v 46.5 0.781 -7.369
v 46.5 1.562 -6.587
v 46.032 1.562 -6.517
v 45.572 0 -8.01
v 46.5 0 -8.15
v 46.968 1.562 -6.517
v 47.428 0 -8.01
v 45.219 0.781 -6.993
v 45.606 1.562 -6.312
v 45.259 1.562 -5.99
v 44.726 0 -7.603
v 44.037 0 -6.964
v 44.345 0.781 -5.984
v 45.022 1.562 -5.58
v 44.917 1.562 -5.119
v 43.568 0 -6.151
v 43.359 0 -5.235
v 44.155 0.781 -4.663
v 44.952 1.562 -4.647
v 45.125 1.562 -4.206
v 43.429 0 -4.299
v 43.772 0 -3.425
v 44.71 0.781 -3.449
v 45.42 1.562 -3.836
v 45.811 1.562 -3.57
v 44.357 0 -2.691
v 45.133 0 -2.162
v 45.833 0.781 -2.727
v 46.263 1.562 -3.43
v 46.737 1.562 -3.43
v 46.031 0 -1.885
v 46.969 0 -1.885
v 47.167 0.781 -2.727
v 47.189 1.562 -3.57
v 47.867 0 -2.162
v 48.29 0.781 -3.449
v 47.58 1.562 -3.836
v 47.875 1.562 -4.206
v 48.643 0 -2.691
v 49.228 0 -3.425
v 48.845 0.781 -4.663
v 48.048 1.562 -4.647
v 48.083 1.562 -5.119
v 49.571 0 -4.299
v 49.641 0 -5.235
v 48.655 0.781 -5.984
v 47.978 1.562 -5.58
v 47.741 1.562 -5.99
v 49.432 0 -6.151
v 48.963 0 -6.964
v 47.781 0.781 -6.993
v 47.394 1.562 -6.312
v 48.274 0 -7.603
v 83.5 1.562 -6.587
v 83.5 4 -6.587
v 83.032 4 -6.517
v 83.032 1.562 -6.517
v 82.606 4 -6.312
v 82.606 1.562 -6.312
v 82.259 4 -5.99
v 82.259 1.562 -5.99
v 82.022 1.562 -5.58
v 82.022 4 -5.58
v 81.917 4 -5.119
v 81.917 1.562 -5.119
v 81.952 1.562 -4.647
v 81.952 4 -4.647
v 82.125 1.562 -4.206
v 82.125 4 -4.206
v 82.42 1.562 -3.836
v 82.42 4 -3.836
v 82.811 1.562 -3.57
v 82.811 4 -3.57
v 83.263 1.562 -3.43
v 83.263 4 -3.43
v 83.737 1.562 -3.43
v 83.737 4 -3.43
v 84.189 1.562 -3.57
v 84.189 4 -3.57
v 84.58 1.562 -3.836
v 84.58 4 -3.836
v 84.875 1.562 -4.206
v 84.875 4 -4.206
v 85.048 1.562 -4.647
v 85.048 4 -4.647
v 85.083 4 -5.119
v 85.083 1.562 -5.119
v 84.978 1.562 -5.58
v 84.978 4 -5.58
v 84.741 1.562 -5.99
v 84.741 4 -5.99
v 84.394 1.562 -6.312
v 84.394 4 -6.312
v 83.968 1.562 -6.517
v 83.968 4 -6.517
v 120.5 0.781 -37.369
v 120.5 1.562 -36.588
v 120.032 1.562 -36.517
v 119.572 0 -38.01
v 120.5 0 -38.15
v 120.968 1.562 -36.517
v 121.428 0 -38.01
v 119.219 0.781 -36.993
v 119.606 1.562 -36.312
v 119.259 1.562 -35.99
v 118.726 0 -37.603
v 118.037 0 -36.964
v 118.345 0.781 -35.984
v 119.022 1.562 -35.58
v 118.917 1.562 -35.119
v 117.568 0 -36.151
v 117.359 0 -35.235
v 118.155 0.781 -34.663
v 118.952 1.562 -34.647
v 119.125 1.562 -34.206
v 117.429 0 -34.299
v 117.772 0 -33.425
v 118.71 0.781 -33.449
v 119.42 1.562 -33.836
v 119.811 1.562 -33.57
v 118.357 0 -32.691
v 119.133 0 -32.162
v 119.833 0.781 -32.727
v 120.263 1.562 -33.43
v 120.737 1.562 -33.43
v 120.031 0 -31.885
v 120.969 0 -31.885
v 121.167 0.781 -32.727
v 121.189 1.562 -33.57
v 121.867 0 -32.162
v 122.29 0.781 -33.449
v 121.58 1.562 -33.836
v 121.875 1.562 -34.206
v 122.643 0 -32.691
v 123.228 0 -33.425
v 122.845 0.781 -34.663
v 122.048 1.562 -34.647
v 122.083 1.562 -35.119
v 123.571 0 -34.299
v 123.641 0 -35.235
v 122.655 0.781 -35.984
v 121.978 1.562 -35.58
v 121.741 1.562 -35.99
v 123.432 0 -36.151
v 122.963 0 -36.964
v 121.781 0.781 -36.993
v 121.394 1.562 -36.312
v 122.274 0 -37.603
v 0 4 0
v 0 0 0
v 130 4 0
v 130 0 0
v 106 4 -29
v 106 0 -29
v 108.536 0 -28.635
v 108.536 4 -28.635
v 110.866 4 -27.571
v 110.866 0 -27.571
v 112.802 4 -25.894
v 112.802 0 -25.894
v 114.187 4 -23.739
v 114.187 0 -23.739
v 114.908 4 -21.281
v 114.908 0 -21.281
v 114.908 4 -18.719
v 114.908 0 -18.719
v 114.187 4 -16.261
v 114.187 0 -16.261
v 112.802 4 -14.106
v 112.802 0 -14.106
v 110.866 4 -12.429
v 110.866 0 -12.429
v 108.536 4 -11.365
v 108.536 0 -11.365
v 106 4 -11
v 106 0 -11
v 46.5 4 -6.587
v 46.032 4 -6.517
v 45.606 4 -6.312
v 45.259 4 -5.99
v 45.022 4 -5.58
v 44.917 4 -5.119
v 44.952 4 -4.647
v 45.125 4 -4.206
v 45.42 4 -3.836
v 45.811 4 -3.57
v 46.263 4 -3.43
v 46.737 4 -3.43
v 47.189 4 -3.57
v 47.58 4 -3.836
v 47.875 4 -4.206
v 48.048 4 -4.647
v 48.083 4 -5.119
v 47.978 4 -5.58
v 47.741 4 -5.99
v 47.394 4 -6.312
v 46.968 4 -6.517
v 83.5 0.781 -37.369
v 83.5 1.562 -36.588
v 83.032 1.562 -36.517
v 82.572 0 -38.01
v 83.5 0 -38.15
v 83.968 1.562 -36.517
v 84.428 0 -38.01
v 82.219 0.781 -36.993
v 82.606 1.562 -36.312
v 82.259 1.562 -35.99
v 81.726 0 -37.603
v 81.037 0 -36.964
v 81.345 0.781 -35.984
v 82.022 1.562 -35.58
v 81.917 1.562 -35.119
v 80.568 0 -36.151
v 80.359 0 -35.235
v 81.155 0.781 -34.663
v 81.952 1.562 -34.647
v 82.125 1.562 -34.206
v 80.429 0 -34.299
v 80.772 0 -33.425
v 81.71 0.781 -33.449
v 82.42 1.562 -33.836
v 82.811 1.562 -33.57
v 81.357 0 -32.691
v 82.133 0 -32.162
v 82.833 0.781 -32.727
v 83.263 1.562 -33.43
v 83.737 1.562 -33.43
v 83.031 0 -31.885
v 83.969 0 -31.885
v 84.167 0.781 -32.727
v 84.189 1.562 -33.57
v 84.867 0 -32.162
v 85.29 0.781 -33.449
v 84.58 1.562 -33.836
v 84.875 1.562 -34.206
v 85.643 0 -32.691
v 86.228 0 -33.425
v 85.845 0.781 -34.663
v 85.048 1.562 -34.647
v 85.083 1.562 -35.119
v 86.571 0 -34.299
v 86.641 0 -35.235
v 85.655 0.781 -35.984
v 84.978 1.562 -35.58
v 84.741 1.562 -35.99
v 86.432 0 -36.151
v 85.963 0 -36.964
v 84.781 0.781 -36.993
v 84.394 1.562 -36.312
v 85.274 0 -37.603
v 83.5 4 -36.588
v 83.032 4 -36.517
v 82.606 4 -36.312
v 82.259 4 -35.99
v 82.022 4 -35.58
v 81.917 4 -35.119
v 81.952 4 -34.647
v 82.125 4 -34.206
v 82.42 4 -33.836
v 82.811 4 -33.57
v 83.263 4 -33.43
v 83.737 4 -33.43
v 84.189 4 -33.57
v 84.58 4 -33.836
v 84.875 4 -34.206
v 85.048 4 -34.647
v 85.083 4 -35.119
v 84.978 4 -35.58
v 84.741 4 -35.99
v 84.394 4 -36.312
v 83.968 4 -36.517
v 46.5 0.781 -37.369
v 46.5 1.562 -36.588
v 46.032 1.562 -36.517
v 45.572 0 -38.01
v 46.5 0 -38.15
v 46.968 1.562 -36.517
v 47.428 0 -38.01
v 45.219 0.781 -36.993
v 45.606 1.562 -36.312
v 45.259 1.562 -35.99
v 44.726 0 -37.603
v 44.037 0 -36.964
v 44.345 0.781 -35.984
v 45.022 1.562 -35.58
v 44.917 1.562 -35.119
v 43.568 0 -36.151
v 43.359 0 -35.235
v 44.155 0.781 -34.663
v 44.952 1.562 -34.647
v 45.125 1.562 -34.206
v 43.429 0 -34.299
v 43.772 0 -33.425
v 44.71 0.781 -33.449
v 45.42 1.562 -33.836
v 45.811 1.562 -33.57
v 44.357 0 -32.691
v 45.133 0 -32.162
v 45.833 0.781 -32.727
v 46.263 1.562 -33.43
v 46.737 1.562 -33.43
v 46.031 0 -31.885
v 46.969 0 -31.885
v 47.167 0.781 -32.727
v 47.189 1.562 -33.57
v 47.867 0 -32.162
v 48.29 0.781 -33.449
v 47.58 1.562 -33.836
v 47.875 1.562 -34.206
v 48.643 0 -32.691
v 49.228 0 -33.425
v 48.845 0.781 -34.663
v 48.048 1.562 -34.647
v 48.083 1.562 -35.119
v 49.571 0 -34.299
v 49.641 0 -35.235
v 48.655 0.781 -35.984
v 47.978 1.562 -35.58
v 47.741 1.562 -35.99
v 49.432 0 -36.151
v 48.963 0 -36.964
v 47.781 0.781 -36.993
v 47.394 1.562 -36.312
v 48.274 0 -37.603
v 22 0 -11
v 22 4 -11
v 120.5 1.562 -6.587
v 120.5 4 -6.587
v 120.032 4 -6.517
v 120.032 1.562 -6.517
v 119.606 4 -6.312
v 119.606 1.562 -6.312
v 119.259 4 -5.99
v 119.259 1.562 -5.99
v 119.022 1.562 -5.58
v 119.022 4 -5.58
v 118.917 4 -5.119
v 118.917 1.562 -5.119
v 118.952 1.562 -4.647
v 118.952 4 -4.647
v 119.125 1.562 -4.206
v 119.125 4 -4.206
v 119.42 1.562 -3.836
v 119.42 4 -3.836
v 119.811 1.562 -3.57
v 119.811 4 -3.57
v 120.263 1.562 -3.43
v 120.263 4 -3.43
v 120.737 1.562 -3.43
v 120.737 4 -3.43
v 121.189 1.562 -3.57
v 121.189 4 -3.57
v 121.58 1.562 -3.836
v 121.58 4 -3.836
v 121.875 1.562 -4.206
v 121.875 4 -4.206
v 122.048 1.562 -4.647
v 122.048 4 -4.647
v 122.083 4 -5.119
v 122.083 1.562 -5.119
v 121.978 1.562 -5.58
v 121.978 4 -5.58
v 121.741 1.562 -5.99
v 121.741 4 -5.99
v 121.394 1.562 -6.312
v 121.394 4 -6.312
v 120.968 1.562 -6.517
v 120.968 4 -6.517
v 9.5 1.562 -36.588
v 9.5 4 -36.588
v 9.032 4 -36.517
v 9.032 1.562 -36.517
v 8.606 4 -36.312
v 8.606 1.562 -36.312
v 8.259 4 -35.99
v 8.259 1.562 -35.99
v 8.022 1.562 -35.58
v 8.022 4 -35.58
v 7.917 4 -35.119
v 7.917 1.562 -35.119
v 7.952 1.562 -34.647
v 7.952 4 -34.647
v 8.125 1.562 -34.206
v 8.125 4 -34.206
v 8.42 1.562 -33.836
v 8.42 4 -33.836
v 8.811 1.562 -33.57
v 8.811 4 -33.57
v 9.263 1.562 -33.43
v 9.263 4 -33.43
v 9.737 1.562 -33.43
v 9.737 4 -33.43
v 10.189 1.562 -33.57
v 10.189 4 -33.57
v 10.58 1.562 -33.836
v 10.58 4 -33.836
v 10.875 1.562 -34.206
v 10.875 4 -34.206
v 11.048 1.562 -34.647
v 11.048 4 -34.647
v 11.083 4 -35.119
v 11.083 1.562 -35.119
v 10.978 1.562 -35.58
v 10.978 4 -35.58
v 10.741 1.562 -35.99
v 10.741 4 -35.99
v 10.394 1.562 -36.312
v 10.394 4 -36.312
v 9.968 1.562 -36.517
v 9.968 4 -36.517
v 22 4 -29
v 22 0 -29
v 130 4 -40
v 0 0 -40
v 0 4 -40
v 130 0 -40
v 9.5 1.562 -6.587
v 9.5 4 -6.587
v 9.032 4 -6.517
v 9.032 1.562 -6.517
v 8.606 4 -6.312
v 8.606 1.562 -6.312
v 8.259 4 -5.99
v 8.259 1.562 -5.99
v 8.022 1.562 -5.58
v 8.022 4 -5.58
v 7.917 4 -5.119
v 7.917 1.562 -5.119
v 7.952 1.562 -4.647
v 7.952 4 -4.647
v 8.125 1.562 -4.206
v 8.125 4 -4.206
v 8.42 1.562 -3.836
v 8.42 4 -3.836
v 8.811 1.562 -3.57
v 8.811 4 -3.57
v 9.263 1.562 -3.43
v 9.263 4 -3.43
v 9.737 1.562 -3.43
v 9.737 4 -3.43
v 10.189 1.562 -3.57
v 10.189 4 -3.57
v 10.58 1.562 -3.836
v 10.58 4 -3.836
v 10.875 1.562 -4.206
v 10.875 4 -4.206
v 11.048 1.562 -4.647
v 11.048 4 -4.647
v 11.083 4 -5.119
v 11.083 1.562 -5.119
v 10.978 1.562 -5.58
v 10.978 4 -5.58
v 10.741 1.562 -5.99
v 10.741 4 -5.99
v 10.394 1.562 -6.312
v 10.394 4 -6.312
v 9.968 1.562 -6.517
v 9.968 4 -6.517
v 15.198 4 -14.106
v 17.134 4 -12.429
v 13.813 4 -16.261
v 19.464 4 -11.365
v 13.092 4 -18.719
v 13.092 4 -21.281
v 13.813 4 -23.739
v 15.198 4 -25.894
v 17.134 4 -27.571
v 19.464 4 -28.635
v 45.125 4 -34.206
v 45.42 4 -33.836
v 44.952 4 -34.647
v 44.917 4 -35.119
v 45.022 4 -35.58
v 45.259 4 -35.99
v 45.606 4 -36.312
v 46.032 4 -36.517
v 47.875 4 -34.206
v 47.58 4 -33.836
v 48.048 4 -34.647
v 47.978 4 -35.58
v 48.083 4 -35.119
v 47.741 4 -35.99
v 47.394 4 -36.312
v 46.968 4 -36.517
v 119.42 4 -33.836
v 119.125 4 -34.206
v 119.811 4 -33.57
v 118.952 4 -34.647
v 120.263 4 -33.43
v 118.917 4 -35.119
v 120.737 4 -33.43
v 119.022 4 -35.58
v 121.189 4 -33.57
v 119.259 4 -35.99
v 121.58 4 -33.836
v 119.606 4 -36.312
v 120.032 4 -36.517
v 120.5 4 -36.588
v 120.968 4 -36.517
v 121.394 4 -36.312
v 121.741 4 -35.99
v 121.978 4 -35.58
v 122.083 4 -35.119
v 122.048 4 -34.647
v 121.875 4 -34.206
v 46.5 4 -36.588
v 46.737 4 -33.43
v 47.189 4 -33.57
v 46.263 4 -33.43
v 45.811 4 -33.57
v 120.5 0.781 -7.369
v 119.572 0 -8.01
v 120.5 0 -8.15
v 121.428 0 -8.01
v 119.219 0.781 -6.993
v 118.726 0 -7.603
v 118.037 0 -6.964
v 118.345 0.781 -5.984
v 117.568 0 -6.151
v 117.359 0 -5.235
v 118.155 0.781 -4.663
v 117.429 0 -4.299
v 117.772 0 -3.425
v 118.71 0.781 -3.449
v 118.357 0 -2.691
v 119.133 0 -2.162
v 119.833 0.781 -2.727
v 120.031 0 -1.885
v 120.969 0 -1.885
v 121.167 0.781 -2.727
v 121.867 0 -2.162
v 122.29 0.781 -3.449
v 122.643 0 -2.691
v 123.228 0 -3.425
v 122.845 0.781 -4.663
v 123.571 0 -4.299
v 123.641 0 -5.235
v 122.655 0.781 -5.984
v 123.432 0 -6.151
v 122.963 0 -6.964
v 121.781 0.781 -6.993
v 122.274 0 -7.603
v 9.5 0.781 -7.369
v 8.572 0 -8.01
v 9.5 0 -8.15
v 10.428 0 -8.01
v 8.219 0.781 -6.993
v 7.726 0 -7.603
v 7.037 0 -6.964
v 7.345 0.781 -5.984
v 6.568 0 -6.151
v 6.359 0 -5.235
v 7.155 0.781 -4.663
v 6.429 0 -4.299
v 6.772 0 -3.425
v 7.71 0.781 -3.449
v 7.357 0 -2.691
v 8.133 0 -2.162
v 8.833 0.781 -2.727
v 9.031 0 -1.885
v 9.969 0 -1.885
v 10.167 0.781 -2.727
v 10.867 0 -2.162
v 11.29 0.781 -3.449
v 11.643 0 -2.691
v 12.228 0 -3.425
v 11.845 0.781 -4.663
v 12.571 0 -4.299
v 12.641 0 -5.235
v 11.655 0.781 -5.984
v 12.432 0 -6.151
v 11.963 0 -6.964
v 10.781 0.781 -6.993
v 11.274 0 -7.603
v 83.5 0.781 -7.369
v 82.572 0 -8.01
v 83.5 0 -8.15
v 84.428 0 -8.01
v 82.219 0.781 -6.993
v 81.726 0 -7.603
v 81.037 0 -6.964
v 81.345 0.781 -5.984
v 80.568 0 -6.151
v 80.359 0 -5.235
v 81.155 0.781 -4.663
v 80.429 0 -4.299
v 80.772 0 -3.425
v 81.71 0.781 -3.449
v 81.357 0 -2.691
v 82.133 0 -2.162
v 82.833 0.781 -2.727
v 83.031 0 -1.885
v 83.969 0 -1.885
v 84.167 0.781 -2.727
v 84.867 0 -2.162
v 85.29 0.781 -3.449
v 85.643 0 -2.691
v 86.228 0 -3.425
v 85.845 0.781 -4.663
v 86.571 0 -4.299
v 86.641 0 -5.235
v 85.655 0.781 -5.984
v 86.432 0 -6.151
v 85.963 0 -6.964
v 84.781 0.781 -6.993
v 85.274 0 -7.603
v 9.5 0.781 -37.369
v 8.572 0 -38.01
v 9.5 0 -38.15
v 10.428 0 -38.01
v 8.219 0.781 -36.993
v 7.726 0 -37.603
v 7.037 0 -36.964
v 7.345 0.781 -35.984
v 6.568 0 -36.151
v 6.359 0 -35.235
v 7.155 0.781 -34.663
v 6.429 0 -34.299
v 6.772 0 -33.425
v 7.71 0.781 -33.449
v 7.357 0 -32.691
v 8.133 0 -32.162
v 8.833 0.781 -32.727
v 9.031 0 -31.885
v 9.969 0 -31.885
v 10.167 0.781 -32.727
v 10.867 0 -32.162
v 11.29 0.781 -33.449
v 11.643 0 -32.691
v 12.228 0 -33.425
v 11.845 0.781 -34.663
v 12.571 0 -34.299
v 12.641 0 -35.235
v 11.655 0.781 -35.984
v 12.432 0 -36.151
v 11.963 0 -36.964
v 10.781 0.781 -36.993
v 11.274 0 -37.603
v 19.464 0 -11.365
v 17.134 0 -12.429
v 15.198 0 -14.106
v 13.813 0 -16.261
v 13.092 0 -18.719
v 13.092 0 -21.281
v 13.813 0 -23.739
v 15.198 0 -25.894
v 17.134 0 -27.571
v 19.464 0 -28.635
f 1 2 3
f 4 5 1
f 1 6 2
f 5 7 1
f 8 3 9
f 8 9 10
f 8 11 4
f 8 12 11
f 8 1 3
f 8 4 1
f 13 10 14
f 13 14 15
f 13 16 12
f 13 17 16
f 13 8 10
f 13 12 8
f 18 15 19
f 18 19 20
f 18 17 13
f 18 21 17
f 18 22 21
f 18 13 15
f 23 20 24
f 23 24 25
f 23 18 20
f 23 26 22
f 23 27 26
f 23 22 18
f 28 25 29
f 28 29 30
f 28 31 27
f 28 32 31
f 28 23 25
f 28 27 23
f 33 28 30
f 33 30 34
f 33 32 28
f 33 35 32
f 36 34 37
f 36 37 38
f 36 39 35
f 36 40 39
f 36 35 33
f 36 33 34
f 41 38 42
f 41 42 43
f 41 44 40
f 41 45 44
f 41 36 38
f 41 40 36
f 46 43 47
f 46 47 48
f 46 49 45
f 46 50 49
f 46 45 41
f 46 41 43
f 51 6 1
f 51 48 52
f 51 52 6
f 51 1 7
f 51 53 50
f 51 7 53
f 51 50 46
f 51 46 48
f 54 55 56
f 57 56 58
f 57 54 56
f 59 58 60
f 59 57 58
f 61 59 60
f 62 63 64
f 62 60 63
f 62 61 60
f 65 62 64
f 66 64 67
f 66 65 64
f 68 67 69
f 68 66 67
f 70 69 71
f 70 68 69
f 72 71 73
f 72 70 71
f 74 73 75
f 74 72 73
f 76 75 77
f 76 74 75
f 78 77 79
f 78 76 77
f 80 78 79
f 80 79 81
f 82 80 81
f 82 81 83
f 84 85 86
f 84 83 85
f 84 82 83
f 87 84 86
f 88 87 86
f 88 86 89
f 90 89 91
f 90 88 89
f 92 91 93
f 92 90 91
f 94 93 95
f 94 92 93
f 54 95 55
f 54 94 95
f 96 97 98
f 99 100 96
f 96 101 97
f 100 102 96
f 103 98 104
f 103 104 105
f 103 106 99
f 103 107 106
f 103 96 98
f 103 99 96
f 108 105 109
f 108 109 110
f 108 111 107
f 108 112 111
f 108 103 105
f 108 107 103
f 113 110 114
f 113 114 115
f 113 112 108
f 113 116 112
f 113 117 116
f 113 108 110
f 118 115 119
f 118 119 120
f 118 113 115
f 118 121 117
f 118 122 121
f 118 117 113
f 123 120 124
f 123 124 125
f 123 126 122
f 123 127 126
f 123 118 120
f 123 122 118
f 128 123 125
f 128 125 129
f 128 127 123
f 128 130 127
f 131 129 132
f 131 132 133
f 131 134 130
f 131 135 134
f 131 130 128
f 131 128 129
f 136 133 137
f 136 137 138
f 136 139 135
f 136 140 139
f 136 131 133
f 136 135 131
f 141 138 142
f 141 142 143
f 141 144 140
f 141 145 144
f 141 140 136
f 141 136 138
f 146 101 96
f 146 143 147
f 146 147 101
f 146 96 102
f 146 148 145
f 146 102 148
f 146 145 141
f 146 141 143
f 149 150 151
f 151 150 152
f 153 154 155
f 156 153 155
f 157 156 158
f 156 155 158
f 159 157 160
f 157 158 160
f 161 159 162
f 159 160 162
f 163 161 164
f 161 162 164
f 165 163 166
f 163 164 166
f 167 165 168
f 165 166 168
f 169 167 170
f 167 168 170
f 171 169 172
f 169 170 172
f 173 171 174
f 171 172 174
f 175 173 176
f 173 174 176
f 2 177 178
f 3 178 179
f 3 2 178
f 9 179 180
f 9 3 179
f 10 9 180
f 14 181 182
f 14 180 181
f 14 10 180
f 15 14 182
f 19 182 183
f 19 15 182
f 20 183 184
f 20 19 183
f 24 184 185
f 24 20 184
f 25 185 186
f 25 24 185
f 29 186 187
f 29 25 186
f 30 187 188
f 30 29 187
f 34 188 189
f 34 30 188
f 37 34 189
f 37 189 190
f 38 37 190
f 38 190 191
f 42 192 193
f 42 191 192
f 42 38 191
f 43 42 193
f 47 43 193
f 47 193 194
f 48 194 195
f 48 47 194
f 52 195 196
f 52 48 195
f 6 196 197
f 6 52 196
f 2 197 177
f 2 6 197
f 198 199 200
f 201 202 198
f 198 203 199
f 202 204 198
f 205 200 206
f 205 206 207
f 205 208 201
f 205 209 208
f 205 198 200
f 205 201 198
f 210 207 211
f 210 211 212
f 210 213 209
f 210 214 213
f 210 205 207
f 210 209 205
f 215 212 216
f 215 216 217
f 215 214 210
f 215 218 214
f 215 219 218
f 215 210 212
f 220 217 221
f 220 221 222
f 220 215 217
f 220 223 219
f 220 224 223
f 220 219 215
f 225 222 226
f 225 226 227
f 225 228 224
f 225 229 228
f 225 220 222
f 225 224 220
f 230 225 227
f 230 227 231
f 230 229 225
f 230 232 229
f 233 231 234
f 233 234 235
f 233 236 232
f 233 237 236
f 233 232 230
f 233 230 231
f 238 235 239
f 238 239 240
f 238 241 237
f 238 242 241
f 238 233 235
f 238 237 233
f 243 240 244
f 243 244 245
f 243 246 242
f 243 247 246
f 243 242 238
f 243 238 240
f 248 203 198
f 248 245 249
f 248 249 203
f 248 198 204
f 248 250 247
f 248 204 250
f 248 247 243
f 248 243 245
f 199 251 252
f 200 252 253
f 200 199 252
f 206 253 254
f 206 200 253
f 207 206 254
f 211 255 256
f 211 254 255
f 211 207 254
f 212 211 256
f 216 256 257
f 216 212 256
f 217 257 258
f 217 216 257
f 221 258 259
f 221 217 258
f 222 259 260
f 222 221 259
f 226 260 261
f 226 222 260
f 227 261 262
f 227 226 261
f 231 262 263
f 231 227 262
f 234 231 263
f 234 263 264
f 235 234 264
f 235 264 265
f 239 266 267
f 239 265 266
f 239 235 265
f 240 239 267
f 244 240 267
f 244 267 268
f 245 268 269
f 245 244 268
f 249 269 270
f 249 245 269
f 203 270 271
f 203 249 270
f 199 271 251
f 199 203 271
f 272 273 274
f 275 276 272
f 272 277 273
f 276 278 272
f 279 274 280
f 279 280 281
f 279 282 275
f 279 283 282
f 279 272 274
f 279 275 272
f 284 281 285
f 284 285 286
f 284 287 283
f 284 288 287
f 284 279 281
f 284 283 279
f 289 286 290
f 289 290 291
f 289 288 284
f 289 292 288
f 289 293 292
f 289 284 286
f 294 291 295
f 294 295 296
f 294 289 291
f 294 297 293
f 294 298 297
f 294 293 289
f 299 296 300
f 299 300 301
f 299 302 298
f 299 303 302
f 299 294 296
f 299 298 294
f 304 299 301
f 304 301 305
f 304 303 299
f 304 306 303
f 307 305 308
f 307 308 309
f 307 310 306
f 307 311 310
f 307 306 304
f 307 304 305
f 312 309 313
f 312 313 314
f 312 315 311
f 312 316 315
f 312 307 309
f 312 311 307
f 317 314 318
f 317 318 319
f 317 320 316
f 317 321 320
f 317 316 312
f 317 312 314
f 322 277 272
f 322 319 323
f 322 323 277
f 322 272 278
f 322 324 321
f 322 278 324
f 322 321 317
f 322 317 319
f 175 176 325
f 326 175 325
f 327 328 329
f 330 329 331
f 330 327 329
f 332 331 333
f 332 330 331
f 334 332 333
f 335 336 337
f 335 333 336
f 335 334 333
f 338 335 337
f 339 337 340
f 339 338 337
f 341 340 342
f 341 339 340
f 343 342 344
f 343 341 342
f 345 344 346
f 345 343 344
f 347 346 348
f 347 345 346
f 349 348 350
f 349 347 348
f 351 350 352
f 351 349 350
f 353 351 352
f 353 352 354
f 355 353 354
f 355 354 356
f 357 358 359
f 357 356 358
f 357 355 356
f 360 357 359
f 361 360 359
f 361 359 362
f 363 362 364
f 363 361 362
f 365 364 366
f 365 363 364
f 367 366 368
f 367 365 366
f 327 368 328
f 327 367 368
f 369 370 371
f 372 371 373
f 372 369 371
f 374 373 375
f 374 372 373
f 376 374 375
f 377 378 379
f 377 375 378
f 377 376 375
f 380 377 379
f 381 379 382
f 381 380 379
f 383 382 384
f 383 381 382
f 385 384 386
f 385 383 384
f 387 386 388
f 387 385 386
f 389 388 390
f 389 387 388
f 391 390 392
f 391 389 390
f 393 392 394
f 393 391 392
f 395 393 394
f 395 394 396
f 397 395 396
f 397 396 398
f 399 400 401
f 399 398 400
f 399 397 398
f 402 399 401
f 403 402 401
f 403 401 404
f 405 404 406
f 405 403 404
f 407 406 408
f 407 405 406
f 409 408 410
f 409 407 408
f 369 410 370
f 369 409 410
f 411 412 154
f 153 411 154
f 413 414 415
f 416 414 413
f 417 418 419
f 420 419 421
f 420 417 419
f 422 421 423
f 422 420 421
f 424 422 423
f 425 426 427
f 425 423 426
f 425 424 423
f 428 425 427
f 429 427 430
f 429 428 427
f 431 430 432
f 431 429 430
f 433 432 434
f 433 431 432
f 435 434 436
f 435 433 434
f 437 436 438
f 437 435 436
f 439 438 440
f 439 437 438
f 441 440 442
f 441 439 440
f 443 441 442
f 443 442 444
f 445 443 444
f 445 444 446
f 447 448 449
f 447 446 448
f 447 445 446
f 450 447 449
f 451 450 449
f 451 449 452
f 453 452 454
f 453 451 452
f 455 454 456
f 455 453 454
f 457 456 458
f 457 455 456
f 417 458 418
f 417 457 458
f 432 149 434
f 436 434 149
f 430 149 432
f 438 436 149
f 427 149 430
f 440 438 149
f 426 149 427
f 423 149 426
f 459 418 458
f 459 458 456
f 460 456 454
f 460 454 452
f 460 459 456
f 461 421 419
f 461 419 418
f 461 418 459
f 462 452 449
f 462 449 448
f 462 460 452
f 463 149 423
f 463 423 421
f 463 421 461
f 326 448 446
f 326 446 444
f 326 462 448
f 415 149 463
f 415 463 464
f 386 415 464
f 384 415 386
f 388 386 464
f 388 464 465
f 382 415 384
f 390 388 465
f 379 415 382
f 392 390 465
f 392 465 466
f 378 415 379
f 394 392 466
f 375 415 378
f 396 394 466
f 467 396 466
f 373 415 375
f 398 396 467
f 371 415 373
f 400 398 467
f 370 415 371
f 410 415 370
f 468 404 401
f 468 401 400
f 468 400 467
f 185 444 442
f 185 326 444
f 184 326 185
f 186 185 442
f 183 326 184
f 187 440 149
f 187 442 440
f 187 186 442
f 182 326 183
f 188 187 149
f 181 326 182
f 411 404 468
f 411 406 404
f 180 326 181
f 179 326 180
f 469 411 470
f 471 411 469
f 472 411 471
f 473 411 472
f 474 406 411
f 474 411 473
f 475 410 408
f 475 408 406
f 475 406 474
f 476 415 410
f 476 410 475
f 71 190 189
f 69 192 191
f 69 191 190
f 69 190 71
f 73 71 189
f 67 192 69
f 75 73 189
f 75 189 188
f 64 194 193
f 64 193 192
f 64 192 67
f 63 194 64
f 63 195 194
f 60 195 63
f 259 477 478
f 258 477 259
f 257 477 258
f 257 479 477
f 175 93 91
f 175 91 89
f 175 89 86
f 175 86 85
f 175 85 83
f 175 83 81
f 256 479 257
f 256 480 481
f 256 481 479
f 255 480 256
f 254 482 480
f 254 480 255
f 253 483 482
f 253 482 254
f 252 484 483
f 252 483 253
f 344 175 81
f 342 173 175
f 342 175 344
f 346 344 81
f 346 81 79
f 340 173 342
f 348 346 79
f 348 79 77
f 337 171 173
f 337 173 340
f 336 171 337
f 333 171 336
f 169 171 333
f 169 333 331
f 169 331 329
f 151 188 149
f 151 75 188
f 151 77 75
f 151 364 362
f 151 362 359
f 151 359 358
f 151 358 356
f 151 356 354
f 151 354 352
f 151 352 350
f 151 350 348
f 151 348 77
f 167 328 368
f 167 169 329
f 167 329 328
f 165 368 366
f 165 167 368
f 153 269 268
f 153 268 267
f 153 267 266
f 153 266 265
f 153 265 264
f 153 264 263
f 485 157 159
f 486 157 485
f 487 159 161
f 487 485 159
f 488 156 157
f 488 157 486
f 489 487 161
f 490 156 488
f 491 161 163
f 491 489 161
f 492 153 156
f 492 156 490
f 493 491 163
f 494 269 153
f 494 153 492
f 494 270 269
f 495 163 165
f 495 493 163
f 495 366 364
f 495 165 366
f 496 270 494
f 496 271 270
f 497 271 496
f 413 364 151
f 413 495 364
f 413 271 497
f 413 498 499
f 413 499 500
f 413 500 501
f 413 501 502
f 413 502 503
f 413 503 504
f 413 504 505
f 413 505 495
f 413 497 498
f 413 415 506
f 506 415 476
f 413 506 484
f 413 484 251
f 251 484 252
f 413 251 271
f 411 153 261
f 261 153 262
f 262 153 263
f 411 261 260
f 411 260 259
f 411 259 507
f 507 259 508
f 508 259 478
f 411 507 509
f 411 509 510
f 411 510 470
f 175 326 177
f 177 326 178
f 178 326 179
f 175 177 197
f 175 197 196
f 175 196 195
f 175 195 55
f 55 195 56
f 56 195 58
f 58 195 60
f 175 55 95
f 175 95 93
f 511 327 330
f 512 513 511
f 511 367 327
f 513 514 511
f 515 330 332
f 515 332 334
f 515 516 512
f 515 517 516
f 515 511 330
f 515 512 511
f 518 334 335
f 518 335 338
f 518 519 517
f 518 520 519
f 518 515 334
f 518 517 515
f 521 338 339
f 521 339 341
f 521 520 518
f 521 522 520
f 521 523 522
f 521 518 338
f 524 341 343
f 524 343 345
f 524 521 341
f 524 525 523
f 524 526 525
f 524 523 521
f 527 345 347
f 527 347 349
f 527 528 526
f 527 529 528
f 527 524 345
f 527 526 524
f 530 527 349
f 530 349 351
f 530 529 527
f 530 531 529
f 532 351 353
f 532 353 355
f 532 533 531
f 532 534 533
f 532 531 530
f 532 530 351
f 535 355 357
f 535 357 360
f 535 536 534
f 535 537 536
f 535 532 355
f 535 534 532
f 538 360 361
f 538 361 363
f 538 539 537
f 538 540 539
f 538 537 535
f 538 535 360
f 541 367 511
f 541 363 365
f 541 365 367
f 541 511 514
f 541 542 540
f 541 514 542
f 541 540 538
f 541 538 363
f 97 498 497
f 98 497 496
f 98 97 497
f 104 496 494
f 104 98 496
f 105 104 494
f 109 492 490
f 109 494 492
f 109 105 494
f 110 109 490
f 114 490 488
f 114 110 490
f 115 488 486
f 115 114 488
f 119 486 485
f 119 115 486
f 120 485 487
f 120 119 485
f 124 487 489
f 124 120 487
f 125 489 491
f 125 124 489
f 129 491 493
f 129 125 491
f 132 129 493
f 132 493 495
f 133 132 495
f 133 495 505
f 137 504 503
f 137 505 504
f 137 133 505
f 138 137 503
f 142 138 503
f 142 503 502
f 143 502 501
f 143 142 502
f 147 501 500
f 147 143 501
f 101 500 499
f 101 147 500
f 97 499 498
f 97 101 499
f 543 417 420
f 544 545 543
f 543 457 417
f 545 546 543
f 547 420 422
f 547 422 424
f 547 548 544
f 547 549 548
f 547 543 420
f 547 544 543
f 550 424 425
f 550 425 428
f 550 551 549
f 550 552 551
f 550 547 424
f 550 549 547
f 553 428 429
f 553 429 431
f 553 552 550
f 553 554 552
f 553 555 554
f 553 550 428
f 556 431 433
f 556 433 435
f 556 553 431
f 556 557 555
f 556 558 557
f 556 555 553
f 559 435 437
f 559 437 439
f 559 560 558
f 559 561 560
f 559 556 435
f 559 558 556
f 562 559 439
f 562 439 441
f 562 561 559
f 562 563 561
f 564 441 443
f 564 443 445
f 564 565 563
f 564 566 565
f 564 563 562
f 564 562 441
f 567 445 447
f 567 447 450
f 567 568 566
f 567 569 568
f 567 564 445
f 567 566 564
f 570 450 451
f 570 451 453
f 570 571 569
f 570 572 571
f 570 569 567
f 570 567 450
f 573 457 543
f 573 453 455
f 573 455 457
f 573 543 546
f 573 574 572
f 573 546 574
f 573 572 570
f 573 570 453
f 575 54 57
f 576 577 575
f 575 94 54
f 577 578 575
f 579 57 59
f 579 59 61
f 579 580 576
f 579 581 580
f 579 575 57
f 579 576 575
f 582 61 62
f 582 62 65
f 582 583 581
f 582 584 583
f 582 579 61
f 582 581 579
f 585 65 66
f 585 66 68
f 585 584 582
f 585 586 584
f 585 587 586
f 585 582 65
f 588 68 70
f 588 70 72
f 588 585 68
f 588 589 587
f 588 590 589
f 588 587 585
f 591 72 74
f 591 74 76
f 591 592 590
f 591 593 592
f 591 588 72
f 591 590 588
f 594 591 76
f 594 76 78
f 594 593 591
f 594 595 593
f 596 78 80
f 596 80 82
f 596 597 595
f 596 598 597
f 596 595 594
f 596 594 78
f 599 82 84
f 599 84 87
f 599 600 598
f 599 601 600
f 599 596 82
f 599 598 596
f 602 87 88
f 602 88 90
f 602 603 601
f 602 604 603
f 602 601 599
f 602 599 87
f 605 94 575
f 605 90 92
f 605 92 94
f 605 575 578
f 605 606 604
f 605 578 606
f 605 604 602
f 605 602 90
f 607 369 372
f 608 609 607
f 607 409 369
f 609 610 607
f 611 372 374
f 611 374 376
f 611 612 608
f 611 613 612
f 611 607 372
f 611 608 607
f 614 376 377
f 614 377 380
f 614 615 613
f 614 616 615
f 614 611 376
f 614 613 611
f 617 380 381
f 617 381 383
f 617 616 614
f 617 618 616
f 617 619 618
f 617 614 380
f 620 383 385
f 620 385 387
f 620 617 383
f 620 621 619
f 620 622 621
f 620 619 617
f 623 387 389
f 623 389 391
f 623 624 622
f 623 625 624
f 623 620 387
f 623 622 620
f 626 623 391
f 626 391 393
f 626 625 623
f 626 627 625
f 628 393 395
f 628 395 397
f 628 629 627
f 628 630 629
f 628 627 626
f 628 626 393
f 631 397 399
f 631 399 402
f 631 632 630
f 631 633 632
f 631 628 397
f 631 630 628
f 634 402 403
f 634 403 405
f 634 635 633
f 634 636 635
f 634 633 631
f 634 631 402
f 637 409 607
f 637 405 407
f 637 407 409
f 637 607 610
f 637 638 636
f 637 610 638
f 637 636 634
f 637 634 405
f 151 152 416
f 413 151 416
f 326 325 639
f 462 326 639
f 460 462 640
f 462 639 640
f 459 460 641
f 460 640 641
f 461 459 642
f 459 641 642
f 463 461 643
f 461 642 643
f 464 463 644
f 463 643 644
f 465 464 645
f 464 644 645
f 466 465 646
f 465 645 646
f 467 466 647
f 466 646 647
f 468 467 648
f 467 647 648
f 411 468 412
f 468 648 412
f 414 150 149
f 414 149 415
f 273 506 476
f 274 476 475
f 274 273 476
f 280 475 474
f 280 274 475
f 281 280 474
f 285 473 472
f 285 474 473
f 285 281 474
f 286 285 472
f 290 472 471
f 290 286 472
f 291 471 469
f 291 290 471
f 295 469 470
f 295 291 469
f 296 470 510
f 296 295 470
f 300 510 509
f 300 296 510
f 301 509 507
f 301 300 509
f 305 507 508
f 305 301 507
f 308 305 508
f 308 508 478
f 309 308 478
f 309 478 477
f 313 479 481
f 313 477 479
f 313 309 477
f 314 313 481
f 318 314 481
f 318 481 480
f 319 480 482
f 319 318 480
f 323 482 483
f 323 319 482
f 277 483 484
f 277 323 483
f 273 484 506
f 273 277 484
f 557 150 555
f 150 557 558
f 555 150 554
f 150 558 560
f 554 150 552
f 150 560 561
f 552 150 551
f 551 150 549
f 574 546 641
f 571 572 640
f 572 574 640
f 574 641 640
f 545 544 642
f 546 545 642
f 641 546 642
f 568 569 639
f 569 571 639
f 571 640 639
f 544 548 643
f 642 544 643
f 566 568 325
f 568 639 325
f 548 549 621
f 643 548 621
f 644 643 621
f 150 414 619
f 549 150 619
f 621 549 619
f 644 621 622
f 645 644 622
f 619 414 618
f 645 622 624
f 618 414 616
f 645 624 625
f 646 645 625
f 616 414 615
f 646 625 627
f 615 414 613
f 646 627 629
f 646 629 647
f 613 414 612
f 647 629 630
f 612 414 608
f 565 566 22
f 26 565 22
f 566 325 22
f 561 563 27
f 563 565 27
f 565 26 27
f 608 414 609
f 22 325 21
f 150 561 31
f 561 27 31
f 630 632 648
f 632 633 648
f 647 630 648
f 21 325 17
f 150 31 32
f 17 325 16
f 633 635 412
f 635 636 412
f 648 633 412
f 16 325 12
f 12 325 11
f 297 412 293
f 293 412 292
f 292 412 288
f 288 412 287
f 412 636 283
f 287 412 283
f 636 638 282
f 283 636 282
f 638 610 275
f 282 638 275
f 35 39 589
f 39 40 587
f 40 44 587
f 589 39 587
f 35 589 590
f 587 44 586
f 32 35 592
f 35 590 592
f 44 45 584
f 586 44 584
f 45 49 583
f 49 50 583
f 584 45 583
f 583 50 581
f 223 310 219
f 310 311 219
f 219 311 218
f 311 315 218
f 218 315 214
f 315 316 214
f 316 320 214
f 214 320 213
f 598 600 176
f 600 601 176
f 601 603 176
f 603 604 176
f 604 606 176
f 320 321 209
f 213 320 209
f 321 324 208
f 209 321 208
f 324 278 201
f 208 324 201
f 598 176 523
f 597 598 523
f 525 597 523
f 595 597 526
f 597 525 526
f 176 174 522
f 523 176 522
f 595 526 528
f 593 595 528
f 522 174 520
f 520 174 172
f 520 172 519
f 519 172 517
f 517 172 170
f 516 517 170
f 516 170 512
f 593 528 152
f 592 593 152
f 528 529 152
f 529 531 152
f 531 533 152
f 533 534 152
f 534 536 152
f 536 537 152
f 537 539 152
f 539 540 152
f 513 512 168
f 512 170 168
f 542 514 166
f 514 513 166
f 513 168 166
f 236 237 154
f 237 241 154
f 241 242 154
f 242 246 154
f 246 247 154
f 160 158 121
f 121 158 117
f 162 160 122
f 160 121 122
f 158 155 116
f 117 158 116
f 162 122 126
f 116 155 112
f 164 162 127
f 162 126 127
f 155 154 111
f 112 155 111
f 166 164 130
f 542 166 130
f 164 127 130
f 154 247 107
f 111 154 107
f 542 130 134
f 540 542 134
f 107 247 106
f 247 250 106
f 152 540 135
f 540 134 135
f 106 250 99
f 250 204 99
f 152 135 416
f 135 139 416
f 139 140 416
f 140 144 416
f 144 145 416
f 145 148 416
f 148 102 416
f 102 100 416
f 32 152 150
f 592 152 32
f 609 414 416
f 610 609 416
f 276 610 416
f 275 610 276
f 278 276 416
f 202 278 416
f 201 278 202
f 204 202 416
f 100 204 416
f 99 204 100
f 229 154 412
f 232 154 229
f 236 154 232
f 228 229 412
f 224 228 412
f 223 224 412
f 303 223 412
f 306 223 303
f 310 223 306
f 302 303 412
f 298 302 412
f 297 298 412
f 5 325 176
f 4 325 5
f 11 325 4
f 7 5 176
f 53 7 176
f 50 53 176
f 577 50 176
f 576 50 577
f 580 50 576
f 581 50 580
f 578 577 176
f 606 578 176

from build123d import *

# Parameters (mm, degrees)
ESBO_O1_W                 = 130
ESBO_O1_H                 = 40
RESSALTO_EXTRUS_O1_DEPTH  = 4
PADR_O_LINEAR1_COUNT      = 4
PADR_O_LINEAR1_PITCH      = 37
PADR_O_LINEAR1_COUNT_DIR2 = 2
PADR_O_LINEAR1_PITCH_DIR2 = 30


with BuildPart() as part:
    # Esboço1 → Ressalto-extrusão1 (new body)
    with BuildSketch(Plane(origin=(0, 0, 0), x_dir=(1, 0, 0), z_dir=(0, 1, 0))):
        with Locations((65, 20)):
            Rectangle(ESBO_O1_W, ESBO_O1_H)
        with BuildLine():
            Line((22, 29), (106, 29))
            ThreePointArc((106, 29), (115, 20), (106, 11))
            Line((106, 11), (22, 11))
            ThreePointArc((22, 11), (13, 20), (22, 29))
        make_face(mode=Mode.SUBTRACT)
    extrude(amount=RESSALTO_EXTRUS_O1_DEPTH)

    # Esboço4 → Escareado para parafuso com cabeça escareada elevada de M31 (revolve, cut)
    with BuildSketch(Plane(origin=(9.5, 0, -35), x_dir=(0, 0, -1), z_dir=(1, 0, 0))):
        Polygon((0, 0), (0, 13.953866233), (1.5875, 13), (1.5875, 1.5625), (3.15, 0), align=None)
    escareado_para_parafuso_com_cabe_a_escar = revolve(axis=Axis((9.5, -6.35, -35), (0, 1, 0)), mode=Mode.SUBTRACT)

    # Padrão linear1: Escareado para parafuso com cabe_a escar 4 × 2
    with Locations(*[(i * PADR_O_LINEAR1_PITCH, 0, j * PADR_O_LINEAR1_PITCH_DIR2) for i in range(PADR_O_LINEAR1_COUNT) for j in range(PADR_O_LINEAR1_COUNT_DIR2) if (i, j) != (0, 0)]):
        add(escareado_para_parafuso_com_cabe_a_escar, mode=Mode.SUBTRACT)


solid = part.part
